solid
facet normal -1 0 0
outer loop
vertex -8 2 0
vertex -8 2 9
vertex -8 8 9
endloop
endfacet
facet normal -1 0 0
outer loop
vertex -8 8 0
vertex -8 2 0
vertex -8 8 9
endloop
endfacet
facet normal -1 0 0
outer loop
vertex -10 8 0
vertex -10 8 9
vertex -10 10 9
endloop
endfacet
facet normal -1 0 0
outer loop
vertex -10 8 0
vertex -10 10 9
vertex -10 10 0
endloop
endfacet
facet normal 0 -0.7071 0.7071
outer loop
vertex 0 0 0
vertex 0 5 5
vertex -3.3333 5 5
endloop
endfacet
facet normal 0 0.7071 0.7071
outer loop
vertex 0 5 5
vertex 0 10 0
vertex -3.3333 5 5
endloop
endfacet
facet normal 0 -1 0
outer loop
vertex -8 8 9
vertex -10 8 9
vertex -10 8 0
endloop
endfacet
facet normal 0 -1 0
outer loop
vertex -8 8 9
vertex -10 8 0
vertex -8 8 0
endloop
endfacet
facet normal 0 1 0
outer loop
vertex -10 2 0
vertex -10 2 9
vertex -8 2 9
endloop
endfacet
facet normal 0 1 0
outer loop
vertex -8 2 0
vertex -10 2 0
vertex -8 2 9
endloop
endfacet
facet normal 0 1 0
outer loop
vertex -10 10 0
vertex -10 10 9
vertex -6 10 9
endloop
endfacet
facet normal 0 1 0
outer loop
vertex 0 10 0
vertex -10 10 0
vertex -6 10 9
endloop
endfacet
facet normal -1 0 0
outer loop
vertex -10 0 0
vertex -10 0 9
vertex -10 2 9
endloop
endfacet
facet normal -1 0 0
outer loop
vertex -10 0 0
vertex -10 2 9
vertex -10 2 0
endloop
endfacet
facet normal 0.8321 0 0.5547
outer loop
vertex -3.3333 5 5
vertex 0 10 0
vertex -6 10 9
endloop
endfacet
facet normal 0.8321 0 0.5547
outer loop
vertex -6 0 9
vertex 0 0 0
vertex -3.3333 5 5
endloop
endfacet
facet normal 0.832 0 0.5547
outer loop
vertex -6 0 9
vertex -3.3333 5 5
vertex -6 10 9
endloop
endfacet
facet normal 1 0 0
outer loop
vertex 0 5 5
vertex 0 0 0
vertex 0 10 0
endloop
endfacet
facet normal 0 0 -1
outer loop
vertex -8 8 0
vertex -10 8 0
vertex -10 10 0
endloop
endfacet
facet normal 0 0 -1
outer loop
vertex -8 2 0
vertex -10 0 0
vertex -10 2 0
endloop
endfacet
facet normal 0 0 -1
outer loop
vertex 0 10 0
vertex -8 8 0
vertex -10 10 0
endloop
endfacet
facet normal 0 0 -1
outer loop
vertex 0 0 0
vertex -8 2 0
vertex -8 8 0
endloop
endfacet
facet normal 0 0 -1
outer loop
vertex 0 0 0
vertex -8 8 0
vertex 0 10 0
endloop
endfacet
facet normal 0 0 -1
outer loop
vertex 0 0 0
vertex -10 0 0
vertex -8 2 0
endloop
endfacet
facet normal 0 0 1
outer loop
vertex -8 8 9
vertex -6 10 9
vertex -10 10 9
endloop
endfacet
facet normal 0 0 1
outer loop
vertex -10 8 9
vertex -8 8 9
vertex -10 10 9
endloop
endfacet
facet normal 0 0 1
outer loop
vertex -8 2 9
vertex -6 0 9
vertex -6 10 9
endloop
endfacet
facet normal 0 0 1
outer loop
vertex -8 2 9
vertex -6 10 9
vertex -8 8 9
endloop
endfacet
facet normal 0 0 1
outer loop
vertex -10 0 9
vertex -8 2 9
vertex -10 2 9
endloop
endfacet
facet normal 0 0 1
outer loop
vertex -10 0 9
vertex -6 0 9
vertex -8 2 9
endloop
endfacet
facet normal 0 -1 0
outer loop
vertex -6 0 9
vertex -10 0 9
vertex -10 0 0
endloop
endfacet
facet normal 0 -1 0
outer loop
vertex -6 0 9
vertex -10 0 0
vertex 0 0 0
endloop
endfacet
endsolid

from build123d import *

# Parameters (mm, degrees)
F1_DEPTH = 10
F2_W     = 2
F2_H     = 6
F3_DEPTH = 9.001


with BuildPart() as f1:
    # F0 (on Front) → F1 (new body)
    with BuildSketch(Plane.XZ):
        Polygon((-6, 9), (-10, 9), (-10, 0), (0, 0), align=None)
    extrude(amount=-F1_DEPTH)

    # F2 (on face) → F3 (cut, through all)
    with BuildSketch(Plane.XY.offset(9)):
        with Locations((-9, 5)):
            Rectangle(F2_W, F2_H)
    extrude(amount=-F3_DEPTH, mode=Mode.SUBTRACT)

    # F4 (on Right) → F5 (join, up to the next surface of F1)
    with BuildSketch(Plane.YZ):
        Polygon((0, 0), (10, 0), (5, 5), align=None)
    extrude(until=Until.NEXT, dir=(-1, 0, 0))


solid = f1.part
